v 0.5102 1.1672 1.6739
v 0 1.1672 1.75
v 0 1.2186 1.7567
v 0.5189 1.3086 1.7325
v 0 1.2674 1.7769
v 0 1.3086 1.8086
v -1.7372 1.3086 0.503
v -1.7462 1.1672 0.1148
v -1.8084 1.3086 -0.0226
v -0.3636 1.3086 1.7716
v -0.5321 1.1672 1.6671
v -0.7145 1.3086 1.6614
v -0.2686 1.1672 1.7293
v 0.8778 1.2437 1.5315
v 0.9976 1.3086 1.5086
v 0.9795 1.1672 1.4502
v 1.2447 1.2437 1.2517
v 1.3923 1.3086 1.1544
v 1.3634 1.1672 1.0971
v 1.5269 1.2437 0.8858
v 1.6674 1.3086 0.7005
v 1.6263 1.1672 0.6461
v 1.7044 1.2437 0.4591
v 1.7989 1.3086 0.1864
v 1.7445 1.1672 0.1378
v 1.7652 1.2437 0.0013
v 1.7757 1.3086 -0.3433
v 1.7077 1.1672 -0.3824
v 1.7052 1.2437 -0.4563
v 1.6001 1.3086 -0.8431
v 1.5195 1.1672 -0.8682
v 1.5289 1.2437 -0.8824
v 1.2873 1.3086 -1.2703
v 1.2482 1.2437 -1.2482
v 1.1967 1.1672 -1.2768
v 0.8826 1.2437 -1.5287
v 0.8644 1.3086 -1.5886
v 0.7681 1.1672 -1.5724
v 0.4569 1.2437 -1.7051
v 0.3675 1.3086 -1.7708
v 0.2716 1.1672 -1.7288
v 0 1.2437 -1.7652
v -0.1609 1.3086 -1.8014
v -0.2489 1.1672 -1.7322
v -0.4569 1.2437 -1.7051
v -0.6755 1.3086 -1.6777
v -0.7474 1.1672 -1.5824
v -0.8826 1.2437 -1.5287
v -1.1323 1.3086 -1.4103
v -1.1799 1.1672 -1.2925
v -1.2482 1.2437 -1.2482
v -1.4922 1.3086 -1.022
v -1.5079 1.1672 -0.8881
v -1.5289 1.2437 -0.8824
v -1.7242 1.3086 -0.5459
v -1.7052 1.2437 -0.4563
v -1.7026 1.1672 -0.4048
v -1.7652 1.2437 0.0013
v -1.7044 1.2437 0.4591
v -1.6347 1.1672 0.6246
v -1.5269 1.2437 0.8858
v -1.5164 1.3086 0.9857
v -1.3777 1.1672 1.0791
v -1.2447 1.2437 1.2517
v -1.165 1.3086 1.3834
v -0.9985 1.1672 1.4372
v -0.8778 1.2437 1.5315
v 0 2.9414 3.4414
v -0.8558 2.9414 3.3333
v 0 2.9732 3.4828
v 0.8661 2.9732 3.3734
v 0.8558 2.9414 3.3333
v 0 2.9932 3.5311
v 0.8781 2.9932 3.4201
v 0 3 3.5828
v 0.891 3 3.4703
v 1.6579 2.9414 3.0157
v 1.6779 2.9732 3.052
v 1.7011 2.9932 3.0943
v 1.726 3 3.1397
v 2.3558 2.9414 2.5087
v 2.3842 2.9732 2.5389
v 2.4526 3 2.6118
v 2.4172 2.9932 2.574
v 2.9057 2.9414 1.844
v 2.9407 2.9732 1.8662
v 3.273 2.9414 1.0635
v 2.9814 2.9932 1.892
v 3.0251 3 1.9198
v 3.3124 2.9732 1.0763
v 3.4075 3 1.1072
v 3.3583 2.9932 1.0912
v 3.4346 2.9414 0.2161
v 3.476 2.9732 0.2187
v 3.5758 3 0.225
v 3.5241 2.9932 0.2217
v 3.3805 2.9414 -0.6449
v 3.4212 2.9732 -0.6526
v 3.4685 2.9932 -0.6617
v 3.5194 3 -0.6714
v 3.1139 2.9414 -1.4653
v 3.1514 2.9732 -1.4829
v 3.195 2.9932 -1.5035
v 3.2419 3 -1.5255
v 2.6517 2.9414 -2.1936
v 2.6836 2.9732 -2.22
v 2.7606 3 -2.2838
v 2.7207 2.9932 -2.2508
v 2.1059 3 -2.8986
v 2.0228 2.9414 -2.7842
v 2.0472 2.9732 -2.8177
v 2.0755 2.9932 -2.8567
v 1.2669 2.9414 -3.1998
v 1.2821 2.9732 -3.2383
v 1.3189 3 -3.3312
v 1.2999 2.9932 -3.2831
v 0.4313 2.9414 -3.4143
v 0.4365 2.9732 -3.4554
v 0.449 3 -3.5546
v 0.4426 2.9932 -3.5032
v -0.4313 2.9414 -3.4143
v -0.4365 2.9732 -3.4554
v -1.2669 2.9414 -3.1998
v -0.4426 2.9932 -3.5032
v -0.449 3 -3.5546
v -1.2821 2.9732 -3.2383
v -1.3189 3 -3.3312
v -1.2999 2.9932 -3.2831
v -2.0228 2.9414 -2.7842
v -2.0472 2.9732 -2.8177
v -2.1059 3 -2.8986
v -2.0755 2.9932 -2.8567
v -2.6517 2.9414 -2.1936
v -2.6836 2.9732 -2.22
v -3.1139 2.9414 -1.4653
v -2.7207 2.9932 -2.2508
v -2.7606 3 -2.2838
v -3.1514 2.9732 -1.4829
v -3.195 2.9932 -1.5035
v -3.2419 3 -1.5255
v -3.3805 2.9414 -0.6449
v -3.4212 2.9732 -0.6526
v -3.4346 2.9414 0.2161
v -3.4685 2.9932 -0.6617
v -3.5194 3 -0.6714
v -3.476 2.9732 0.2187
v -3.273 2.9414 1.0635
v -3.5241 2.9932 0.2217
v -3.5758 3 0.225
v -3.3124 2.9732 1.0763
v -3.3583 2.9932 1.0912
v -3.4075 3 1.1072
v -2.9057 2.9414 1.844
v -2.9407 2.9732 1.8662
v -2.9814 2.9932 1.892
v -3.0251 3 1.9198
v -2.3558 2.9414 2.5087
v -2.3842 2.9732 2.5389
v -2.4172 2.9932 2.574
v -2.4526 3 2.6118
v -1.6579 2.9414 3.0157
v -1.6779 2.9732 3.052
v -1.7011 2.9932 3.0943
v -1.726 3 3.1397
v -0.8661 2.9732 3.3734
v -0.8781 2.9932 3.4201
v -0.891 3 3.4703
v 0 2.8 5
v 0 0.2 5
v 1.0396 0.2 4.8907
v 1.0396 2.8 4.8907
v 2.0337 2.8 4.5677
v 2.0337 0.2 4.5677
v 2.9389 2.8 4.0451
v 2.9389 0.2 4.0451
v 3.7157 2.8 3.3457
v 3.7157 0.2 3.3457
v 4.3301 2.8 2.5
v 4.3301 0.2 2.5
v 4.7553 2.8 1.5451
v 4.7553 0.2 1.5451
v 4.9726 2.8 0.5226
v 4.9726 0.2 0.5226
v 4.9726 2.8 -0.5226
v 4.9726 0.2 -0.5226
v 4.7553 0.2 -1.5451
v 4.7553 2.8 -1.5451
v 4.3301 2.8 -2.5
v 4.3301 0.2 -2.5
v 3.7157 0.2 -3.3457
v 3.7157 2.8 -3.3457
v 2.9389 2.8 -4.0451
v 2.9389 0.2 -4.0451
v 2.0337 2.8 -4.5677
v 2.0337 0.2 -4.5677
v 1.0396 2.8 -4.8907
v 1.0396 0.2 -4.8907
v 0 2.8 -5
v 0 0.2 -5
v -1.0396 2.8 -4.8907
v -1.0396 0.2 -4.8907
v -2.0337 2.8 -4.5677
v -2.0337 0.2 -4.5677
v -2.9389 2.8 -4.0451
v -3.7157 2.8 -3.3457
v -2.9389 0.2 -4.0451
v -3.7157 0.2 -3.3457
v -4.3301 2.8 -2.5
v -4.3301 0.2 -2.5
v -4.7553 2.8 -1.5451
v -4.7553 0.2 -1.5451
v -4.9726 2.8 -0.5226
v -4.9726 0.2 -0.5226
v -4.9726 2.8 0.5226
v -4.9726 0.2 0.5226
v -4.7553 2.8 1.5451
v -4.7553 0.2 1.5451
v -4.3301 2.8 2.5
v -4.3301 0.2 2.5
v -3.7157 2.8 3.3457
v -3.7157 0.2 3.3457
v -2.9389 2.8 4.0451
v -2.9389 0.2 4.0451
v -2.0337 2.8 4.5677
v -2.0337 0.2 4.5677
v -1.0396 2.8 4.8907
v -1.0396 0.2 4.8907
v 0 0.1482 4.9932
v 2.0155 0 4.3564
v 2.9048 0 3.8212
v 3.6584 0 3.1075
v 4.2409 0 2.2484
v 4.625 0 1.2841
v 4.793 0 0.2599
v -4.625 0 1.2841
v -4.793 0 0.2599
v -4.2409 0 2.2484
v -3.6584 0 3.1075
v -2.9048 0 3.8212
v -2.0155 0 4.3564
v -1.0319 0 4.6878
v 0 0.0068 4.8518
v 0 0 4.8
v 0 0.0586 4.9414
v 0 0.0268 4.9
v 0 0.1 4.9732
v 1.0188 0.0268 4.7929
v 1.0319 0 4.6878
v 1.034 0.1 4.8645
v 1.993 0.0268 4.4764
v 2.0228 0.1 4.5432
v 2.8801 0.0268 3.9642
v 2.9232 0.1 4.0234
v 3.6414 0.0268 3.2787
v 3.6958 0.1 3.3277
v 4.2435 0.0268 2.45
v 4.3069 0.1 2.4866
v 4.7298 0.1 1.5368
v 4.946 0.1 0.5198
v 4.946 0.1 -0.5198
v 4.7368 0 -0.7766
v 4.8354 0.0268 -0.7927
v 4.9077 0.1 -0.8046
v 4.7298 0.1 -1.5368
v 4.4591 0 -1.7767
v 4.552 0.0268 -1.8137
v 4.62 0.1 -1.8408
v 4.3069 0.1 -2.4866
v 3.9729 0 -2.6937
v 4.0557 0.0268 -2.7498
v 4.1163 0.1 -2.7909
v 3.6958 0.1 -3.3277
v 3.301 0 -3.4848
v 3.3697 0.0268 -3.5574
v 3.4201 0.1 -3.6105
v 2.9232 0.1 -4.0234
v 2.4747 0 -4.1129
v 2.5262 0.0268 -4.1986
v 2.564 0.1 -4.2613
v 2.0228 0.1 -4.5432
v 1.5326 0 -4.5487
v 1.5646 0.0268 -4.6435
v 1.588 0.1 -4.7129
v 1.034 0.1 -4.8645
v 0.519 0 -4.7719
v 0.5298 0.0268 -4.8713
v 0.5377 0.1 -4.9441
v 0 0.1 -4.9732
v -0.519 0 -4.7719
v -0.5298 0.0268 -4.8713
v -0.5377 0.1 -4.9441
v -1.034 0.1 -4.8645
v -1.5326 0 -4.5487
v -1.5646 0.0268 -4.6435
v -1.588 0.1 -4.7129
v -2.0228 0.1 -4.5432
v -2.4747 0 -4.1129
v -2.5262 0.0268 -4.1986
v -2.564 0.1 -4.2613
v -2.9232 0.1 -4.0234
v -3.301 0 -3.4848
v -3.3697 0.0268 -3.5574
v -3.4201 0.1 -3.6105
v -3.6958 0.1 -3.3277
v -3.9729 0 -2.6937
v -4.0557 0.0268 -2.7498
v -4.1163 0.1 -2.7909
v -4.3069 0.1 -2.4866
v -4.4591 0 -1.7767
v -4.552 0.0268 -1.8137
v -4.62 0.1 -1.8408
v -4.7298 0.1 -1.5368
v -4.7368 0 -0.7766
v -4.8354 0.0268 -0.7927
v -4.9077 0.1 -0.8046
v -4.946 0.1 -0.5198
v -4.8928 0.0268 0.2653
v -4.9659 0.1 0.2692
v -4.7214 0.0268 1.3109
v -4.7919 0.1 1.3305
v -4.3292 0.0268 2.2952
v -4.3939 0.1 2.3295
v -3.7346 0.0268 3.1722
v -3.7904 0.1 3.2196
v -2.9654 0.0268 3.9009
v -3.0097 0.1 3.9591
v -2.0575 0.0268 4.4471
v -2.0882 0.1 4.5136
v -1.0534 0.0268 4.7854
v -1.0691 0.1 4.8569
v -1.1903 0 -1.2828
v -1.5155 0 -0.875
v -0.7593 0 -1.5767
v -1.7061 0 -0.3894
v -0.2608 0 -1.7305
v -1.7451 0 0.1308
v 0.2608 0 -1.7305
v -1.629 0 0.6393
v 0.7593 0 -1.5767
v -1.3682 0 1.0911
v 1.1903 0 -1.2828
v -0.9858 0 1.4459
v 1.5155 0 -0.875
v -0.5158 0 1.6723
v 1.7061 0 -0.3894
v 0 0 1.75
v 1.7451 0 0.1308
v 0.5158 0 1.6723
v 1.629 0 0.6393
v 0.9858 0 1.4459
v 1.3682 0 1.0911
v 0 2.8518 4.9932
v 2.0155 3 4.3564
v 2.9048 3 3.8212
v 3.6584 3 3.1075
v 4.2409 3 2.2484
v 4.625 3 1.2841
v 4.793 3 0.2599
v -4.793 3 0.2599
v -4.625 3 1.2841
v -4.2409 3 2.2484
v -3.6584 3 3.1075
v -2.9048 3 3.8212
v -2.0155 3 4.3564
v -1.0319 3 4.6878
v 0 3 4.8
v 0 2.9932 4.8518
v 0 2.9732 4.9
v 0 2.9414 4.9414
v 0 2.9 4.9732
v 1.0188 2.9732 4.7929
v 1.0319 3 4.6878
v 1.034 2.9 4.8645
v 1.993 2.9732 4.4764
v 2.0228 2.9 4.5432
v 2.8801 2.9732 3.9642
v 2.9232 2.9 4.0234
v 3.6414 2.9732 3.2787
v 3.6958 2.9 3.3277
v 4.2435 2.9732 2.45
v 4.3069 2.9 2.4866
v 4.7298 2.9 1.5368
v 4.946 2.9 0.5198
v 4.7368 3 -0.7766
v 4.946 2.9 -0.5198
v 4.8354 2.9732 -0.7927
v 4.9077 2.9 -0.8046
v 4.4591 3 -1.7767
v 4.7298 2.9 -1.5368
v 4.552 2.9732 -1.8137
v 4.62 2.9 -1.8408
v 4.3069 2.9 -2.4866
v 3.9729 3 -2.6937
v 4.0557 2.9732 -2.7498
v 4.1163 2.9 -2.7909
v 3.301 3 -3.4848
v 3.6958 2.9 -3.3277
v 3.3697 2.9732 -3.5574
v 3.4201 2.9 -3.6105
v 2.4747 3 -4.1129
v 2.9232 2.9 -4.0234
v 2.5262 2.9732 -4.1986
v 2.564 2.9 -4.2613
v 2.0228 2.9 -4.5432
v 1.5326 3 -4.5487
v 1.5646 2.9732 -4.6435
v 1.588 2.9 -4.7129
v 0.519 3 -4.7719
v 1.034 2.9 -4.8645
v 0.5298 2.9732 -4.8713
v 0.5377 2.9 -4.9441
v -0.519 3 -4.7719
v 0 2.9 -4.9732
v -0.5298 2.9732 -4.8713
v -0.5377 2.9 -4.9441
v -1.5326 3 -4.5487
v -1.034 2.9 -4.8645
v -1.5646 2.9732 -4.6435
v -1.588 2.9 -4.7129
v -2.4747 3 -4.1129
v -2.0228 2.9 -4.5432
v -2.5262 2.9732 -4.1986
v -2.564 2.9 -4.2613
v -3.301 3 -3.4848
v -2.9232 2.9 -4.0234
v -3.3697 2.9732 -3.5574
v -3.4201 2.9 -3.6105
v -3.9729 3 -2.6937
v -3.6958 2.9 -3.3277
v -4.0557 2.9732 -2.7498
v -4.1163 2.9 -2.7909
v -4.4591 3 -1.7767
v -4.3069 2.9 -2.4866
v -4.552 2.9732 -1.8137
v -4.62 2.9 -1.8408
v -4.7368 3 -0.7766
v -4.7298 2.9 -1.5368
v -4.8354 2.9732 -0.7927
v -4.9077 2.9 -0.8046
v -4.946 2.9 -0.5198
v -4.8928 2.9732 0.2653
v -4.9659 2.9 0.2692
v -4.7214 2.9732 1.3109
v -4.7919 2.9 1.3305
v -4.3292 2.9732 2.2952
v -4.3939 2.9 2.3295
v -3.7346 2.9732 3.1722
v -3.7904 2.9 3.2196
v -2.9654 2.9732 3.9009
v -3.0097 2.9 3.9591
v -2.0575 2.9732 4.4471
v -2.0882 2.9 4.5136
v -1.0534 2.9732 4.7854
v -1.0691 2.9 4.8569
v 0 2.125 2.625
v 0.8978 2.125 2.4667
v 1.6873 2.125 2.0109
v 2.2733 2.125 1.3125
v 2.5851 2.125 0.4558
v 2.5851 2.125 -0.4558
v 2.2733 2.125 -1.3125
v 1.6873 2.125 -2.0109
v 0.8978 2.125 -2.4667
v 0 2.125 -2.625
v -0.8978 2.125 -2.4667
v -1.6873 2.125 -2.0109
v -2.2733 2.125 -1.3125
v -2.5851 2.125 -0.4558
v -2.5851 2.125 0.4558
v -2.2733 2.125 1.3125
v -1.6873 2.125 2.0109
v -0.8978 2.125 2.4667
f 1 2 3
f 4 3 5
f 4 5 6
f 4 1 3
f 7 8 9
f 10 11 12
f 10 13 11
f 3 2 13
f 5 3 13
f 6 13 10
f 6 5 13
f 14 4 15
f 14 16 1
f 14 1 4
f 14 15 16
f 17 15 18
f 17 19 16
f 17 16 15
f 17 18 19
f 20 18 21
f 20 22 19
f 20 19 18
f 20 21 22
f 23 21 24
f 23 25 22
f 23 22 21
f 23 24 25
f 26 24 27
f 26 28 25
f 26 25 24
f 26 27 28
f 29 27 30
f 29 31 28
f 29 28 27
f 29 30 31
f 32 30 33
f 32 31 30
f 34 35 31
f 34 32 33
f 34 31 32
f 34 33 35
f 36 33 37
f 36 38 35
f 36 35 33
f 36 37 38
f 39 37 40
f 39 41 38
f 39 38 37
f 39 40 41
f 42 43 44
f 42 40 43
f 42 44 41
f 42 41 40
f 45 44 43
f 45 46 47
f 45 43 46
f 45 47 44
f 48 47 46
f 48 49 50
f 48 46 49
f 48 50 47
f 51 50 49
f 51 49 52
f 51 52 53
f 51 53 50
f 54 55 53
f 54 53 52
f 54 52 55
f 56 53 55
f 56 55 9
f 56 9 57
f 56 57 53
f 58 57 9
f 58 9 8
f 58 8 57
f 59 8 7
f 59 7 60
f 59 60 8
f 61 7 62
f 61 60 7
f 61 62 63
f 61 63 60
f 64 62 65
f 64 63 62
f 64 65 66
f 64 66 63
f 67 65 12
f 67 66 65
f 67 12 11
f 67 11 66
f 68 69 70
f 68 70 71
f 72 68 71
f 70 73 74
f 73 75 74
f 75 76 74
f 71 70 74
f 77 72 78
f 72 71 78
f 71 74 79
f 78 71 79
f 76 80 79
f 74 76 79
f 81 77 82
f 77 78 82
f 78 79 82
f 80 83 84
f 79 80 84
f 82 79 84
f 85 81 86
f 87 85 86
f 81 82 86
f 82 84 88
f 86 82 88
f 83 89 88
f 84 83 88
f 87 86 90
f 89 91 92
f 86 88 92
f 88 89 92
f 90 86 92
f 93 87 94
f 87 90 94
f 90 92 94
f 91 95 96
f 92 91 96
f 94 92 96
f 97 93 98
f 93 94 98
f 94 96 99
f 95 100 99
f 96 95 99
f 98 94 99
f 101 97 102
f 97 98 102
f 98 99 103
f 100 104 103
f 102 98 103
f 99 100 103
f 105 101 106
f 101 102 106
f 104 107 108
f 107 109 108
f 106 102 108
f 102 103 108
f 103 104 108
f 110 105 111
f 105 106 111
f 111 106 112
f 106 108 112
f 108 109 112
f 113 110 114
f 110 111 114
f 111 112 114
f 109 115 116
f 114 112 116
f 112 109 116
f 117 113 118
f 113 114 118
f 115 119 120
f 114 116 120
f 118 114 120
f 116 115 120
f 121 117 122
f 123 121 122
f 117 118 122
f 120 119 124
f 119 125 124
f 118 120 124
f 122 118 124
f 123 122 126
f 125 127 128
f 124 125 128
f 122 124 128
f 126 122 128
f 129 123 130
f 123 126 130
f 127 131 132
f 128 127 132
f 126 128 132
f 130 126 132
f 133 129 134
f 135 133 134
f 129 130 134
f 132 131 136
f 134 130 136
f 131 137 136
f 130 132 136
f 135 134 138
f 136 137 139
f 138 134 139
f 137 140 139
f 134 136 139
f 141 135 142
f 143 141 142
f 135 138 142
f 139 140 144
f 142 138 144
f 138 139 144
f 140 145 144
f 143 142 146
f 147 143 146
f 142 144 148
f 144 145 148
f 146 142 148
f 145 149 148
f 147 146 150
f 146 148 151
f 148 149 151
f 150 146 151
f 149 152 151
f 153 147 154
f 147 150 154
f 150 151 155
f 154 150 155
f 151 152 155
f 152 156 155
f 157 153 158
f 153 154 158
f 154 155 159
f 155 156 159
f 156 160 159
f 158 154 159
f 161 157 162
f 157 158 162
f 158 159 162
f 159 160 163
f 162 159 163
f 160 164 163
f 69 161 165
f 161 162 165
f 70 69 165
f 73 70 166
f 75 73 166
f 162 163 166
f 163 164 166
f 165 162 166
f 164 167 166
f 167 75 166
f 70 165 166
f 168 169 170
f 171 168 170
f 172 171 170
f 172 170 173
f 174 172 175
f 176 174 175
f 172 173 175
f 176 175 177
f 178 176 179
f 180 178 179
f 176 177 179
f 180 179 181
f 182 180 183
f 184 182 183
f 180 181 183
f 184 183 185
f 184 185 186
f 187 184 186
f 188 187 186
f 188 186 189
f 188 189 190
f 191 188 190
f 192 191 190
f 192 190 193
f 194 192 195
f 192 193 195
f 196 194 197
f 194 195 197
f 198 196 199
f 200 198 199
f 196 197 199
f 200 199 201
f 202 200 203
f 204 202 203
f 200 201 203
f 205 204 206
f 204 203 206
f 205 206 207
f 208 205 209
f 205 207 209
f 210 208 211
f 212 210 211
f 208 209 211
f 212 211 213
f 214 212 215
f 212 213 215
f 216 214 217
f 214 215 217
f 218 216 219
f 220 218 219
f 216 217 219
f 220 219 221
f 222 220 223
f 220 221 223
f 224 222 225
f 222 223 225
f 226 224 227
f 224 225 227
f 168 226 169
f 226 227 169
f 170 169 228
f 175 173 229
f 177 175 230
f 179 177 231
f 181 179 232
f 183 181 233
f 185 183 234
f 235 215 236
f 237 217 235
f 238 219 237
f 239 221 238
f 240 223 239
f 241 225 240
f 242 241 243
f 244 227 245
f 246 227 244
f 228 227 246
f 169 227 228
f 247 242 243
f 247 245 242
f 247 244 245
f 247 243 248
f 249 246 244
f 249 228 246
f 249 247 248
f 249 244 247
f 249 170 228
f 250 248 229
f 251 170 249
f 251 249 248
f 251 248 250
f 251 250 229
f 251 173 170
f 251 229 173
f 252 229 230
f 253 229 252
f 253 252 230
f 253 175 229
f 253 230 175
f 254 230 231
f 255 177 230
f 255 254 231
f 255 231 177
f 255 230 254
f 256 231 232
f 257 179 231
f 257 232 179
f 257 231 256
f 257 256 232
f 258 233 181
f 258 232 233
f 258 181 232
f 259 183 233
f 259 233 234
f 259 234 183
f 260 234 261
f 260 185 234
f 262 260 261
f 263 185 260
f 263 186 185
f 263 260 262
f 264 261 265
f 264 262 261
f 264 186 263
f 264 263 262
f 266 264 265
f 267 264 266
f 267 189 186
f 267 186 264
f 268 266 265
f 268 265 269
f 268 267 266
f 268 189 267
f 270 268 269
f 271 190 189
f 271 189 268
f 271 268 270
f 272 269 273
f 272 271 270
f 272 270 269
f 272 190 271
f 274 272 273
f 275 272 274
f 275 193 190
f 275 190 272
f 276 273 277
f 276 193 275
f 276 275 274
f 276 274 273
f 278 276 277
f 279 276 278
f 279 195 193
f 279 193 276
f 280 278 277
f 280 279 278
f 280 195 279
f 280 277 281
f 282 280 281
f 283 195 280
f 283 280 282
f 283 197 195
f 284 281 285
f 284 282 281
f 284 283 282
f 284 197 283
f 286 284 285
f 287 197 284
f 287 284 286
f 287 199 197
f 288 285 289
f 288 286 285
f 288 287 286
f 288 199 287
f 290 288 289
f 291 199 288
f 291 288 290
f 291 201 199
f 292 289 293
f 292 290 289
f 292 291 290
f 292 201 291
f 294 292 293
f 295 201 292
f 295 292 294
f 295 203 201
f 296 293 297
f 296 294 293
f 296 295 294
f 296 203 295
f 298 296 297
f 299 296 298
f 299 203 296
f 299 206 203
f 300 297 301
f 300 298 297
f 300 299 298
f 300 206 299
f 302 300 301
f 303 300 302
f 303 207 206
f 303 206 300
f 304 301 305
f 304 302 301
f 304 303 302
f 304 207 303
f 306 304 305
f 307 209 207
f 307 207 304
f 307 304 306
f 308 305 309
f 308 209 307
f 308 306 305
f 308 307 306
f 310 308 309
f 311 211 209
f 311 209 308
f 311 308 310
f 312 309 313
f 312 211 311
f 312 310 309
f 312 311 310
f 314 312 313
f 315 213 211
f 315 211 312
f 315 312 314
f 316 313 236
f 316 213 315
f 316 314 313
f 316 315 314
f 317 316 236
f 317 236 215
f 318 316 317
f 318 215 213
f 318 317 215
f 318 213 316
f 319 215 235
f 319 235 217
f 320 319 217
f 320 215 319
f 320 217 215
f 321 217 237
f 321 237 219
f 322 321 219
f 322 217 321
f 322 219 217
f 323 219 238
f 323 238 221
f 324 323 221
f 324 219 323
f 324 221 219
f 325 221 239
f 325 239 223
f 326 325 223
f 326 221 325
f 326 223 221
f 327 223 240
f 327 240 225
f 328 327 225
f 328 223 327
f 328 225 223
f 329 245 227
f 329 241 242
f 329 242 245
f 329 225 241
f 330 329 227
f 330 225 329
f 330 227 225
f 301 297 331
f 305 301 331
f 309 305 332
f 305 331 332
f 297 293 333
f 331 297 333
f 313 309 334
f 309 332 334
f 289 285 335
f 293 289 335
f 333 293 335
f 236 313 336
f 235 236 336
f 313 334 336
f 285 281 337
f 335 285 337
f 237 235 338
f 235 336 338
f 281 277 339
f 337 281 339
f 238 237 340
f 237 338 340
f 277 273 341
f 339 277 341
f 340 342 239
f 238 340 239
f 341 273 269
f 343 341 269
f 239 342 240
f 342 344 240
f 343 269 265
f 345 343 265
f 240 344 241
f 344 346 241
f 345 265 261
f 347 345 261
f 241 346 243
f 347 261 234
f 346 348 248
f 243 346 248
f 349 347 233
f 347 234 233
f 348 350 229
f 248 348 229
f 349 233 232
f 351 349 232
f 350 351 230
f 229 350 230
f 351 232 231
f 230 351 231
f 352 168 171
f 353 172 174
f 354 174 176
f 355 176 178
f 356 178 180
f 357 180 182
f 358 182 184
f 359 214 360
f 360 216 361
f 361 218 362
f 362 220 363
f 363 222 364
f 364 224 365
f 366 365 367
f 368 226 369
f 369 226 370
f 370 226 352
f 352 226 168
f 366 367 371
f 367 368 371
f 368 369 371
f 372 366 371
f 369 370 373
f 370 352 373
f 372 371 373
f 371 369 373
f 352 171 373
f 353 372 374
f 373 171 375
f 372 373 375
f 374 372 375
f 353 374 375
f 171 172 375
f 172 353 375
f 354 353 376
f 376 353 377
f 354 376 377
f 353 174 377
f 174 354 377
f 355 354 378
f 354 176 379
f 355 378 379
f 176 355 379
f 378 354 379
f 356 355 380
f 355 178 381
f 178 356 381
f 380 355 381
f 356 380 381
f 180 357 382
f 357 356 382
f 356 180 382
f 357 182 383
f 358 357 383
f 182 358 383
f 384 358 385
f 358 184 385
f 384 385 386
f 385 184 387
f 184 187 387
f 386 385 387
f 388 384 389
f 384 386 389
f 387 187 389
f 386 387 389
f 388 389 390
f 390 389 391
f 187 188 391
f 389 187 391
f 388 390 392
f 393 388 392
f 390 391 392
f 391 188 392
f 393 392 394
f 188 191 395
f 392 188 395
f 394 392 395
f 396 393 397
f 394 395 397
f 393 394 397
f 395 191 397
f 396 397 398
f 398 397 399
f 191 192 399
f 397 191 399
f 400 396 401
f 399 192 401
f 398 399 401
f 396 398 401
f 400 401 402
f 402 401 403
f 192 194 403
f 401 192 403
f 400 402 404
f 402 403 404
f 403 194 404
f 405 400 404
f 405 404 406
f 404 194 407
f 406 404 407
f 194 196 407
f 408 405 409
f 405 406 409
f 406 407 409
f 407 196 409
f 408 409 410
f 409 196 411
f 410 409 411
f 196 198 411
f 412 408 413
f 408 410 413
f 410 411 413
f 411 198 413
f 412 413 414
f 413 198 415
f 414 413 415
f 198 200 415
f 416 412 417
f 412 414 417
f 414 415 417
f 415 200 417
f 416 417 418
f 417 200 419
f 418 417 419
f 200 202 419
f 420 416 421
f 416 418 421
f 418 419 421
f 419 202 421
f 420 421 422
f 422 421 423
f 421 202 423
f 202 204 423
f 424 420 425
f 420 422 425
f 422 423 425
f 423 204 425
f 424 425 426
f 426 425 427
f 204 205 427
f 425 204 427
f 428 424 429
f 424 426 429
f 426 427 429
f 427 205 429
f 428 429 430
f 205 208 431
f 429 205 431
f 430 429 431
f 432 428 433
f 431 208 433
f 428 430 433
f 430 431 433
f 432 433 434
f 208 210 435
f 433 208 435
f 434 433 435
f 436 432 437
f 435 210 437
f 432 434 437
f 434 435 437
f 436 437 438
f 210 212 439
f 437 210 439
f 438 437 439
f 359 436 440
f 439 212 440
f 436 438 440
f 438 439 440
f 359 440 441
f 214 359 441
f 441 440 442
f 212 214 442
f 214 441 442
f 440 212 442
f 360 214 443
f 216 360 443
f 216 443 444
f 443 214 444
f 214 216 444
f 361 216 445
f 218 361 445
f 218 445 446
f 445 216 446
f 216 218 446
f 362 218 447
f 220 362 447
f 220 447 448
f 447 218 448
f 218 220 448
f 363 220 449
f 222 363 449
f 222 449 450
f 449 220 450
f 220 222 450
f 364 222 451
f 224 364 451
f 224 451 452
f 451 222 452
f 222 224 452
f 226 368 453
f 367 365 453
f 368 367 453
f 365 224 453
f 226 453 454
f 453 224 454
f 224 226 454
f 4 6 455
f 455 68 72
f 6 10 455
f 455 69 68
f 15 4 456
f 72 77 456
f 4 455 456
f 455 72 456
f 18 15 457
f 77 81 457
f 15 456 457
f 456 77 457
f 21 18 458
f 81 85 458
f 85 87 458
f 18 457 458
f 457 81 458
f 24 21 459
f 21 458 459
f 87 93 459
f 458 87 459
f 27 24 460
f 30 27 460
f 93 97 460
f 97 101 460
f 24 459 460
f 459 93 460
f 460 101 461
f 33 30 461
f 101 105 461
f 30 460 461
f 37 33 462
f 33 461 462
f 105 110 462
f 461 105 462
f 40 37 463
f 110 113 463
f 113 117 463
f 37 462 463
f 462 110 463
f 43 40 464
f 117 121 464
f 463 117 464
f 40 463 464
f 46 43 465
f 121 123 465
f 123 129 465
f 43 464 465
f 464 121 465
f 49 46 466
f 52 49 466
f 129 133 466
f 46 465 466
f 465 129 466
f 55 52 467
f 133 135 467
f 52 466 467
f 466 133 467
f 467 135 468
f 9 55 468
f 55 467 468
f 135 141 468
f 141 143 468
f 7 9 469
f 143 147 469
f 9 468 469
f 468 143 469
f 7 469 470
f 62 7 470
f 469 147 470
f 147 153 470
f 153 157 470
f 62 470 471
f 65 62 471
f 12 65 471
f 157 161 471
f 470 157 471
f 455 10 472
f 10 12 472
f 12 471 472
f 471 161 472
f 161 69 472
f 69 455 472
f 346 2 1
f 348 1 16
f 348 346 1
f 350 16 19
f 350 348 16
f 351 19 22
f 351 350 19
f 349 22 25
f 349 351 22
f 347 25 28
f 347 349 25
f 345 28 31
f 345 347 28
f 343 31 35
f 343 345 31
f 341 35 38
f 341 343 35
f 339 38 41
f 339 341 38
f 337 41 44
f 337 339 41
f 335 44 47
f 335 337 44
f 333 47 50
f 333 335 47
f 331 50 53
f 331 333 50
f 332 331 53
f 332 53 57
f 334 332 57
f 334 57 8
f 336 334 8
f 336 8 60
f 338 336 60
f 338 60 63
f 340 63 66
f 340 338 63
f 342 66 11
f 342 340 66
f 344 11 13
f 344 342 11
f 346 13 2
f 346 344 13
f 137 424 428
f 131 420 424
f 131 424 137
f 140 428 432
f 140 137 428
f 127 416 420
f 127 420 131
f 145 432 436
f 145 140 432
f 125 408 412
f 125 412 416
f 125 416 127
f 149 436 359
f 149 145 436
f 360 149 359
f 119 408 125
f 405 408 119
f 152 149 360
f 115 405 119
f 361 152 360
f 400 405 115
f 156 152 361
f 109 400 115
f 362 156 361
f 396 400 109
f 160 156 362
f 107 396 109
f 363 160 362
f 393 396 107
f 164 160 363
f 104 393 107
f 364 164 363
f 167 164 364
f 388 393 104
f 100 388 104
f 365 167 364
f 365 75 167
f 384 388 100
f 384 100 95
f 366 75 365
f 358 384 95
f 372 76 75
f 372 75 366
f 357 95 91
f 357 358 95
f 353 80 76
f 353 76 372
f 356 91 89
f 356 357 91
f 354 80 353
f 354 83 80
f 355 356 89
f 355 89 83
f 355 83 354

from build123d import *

# Parameters (mm, degrees)
SKETCH_1_R      = 5
SKETCH_1_R_2    = 1.75
EXTRUDE_1_DEPTH = 3
CHAMFER_1_SIZE  = 1.75
FILLET_1_R      = 0.2


with BuildPart() as part:
    # Эскиз1 → Бобышка-Вытянуть1 (new body)
    with BuildSketch(Plane(origin=(0, 0, 0), x_dir=(1, 0, 0), z_dir=(0, 1, 0))):
        with Locations(Location((0, 0, 0), (0, 0, 270))):
            Circle(SKETCH_1_R)
        with Locations(Location((0, 0, 0), (0, 0, 270))):
            Circle(SKETCH_1_R_2, mode=Mode.SUBTRACT)
    extrude(amount=EXTRUDE_1_DEPTH)

    # Фаска1
    chamfer_1_edges = [part.edges().sort_by_distance(p)[0] for p in [
        (0, 3, -1.75),
    ]]
    chamfer(chamfer_1_edges, length=CHAMFER_1_SIZE)

    # Скругление1
    fillet_1_edges = [part.edges().sort_by_distance(p)[0] for p in [
        (0, 3, -3.5),
        (0, 0, -5),
        (0, 3, -5),
        (0, 1.25, -1.75),
    ]]
    fillet(fillet_1_edges, radius=FILLET_1_R)


solid = part.part
